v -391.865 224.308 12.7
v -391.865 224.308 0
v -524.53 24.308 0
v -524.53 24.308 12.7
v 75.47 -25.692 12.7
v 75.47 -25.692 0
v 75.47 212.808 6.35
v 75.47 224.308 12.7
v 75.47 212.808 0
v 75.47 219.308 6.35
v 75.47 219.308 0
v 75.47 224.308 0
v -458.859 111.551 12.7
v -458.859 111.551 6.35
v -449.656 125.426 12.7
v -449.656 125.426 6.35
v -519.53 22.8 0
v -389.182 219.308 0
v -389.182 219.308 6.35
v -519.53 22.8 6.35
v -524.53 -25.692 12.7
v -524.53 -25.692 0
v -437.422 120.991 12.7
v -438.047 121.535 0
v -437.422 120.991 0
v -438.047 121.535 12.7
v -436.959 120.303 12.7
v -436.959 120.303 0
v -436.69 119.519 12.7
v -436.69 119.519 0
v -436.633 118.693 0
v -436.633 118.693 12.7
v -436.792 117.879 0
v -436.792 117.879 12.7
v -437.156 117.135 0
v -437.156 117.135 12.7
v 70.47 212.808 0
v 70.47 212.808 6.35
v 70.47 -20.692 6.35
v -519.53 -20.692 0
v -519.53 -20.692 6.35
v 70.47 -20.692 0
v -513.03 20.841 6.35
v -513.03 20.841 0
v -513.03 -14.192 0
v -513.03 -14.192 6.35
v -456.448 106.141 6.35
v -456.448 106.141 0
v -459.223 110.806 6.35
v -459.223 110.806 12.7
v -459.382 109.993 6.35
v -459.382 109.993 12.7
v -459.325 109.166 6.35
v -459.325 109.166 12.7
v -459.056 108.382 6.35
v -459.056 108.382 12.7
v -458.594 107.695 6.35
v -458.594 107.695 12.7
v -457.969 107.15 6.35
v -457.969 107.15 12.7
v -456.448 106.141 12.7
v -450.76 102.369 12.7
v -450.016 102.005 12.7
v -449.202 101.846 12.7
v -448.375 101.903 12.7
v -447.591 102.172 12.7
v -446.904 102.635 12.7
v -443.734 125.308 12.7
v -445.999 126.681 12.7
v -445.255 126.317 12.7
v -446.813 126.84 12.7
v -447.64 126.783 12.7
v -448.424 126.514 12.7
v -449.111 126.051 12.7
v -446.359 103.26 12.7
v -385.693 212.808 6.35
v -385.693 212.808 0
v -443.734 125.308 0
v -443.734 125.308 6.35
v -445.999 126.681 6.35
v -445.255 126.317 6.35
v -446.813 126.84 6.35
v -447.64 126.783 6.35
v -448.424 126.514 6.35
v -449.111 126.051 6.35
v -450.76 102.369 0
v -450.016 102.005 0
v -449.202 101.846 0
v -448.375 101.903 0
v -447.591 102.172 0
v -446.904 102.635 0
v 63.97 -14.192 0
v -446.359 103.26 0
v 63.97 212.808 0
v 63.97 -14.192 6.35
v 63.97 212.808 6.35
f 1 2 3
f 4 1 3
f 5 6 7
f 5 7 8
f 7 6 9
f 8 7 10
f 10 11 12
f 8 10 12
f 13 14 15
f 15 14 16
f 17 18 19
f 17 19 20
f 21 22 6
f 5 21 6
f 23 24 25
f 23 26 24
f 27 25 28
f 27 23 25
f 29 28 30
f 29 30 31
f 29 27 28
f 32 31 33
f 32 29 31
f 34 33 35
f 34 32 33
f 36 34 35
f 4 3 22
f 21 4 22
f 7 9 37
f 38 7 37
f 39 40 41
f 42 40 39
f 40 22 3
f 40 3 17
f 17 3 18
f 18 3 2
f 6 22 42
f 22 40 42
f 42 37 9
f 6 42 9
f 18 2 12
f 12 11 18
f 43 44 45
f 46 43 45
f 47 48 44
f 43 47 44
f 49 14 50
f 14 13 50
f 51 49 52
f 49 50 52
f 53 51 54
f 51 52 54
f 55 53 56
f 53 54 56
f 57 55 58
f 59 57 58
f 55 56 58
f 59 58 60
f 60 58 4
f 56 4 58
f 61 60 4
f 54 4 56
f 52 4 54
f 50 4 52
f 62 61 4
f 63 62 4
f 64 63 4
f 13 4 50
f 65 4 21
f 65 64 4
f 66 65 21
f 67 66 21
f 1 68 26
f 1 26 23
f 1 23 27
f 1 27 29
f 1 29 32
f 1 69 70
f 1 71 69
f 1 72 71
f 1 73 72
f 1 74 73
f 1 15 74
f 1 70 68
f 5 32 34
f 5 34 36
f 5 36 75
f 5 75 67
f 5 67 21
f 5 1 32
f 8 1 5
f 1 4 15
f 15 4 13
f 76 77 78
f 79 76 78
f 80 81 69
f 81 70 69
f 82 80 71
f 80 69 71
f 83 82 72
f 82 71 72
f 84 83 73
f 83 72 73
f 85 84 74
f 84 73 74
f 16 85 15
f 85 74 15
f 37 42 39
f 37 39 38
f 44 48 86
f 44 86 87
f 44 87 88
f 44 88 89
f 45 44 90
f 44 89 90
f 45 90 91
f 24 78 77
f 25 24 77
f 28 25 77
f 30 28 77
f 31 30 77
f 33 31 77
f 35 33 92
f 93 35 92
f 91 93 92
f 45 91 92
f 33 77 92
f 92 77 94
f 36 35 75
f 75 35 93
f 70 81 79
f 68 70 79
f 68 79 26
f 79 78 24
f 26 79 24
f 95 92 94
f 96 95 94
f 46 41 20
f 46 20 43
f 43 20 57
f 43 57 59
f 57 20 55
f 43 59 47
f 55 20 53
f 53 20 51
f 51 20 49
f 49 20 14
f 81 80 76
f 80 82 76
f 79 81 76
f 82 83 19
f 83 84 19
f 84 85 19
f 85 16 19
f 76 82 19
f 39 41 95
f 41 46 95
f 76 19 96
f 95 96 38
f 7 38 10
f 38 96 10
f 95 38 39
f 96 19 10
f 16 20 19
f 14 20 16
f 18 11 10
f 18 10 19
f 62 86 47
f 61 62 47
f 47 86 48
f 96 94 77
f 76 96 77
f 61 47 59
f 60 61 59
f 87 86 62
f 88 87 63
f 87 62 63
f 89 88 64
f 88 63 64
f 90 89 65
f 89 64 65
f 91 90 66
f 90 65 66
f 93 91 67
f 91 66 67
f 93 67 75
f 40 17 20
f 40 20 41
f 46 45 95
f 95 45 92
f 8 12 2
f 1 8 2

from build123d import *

# Parameters (mm, degrees)
BOSS_EXTRUDE1_DEPTH = 12.7
CUT_EXTRUDE2_DEPTH  = 6.35
CUT_EXTRUDE3_DEPTH  = 571.619829491
FILLET1_R           = 3.175
SKETCH7_W           = 110.518116872
SKETCH7_H           = 6.5
CUT_EXTRUDE4_DEPTH  = 6.35


with BuildPart() as part:
    # Sketch1 → Boss-Extrude1 (new body)
    with BuildSketch(Plane.XY):
        Polygon((-524.529885057, -25.691954023), (75.470114943, -25.691954023), (75.470114943, 224.308045977), (-391.864893443, 224.308045977), (-524.529885057, 24.308045977), align=None)
    extrude(amount=BOSS_EXTRUDE1_DEPTH)

    # Sketch4 → Cut-Extrude2 (cut)
    with BuildSketch(Plane.XY):
        Polygon((-519.529885057, 22.800489254), (-519.529885057, -20.691954023), (70.470114943, -20.691954023), (70.470114943, 219.308045977), (-389.181518234, 219.308045977), align=None)
        Polygon((-513.029885057, 20.840665514), (-513.029885057, -14.191954023), (63.970114943, -14.191954023), (63.970114943, 212.808045977), (-385.693130461, 212.808045977), align=None, mode=Mode.SUBTRACT)
    extrude(amount=CUT_EXTRUDE2_DEPTH, mode=Mode.SUBTRACT)

    # Sketch6 → Cut-Extrude3 (cut, through all)
    with BuildSketch(Plane(origin=(0, 0, 0), x_dir=(-1, 0, 0), z_dir=(0, 0, -1))):
        Polygon((443.734064292, 125.308045977), (435.400730959, 119.780337993), (448.114459322, 100.613671326), (456.447792655, 106.14137931), (460.614459322, 108.905233302), (447.900730959, 128.071899969), align=None)
    extrude(amount=-CUT_EXTRUDE3_DEPTH, mode=Mode.SUBTRACT)

    # Fillet1
    fillet1_edges = [part.edges().sort_by_distance(p)[0] for p in [
        (-447.900730959, 128.071899969, 9.525),
        (-460.614459322, 108.905233302, 9.525),
        (-435.400730959, 119.780337993, 6.35),
        (-448.114459322, 100.613671326, 6.35),
    ]]
    fillet(fillet1_edges, radius=FILLET1_R)

    # Sketch7 → Cut-Extrude4 (cut)
    with BuildSketch(Plane(origin=(0, 0, 0), x_dir=(-1, 0, 0), z_dir=(0, 0, -1))):
        with Locations((-36.124416508, 216.058045977)):
            Rectangle(SKETCH7_W, SKETCH7_H)
    extrude(amount=-CUT_EXTRUDE4_DEPTH, mode=Mode.SUBTRACT)


solid = part.part
